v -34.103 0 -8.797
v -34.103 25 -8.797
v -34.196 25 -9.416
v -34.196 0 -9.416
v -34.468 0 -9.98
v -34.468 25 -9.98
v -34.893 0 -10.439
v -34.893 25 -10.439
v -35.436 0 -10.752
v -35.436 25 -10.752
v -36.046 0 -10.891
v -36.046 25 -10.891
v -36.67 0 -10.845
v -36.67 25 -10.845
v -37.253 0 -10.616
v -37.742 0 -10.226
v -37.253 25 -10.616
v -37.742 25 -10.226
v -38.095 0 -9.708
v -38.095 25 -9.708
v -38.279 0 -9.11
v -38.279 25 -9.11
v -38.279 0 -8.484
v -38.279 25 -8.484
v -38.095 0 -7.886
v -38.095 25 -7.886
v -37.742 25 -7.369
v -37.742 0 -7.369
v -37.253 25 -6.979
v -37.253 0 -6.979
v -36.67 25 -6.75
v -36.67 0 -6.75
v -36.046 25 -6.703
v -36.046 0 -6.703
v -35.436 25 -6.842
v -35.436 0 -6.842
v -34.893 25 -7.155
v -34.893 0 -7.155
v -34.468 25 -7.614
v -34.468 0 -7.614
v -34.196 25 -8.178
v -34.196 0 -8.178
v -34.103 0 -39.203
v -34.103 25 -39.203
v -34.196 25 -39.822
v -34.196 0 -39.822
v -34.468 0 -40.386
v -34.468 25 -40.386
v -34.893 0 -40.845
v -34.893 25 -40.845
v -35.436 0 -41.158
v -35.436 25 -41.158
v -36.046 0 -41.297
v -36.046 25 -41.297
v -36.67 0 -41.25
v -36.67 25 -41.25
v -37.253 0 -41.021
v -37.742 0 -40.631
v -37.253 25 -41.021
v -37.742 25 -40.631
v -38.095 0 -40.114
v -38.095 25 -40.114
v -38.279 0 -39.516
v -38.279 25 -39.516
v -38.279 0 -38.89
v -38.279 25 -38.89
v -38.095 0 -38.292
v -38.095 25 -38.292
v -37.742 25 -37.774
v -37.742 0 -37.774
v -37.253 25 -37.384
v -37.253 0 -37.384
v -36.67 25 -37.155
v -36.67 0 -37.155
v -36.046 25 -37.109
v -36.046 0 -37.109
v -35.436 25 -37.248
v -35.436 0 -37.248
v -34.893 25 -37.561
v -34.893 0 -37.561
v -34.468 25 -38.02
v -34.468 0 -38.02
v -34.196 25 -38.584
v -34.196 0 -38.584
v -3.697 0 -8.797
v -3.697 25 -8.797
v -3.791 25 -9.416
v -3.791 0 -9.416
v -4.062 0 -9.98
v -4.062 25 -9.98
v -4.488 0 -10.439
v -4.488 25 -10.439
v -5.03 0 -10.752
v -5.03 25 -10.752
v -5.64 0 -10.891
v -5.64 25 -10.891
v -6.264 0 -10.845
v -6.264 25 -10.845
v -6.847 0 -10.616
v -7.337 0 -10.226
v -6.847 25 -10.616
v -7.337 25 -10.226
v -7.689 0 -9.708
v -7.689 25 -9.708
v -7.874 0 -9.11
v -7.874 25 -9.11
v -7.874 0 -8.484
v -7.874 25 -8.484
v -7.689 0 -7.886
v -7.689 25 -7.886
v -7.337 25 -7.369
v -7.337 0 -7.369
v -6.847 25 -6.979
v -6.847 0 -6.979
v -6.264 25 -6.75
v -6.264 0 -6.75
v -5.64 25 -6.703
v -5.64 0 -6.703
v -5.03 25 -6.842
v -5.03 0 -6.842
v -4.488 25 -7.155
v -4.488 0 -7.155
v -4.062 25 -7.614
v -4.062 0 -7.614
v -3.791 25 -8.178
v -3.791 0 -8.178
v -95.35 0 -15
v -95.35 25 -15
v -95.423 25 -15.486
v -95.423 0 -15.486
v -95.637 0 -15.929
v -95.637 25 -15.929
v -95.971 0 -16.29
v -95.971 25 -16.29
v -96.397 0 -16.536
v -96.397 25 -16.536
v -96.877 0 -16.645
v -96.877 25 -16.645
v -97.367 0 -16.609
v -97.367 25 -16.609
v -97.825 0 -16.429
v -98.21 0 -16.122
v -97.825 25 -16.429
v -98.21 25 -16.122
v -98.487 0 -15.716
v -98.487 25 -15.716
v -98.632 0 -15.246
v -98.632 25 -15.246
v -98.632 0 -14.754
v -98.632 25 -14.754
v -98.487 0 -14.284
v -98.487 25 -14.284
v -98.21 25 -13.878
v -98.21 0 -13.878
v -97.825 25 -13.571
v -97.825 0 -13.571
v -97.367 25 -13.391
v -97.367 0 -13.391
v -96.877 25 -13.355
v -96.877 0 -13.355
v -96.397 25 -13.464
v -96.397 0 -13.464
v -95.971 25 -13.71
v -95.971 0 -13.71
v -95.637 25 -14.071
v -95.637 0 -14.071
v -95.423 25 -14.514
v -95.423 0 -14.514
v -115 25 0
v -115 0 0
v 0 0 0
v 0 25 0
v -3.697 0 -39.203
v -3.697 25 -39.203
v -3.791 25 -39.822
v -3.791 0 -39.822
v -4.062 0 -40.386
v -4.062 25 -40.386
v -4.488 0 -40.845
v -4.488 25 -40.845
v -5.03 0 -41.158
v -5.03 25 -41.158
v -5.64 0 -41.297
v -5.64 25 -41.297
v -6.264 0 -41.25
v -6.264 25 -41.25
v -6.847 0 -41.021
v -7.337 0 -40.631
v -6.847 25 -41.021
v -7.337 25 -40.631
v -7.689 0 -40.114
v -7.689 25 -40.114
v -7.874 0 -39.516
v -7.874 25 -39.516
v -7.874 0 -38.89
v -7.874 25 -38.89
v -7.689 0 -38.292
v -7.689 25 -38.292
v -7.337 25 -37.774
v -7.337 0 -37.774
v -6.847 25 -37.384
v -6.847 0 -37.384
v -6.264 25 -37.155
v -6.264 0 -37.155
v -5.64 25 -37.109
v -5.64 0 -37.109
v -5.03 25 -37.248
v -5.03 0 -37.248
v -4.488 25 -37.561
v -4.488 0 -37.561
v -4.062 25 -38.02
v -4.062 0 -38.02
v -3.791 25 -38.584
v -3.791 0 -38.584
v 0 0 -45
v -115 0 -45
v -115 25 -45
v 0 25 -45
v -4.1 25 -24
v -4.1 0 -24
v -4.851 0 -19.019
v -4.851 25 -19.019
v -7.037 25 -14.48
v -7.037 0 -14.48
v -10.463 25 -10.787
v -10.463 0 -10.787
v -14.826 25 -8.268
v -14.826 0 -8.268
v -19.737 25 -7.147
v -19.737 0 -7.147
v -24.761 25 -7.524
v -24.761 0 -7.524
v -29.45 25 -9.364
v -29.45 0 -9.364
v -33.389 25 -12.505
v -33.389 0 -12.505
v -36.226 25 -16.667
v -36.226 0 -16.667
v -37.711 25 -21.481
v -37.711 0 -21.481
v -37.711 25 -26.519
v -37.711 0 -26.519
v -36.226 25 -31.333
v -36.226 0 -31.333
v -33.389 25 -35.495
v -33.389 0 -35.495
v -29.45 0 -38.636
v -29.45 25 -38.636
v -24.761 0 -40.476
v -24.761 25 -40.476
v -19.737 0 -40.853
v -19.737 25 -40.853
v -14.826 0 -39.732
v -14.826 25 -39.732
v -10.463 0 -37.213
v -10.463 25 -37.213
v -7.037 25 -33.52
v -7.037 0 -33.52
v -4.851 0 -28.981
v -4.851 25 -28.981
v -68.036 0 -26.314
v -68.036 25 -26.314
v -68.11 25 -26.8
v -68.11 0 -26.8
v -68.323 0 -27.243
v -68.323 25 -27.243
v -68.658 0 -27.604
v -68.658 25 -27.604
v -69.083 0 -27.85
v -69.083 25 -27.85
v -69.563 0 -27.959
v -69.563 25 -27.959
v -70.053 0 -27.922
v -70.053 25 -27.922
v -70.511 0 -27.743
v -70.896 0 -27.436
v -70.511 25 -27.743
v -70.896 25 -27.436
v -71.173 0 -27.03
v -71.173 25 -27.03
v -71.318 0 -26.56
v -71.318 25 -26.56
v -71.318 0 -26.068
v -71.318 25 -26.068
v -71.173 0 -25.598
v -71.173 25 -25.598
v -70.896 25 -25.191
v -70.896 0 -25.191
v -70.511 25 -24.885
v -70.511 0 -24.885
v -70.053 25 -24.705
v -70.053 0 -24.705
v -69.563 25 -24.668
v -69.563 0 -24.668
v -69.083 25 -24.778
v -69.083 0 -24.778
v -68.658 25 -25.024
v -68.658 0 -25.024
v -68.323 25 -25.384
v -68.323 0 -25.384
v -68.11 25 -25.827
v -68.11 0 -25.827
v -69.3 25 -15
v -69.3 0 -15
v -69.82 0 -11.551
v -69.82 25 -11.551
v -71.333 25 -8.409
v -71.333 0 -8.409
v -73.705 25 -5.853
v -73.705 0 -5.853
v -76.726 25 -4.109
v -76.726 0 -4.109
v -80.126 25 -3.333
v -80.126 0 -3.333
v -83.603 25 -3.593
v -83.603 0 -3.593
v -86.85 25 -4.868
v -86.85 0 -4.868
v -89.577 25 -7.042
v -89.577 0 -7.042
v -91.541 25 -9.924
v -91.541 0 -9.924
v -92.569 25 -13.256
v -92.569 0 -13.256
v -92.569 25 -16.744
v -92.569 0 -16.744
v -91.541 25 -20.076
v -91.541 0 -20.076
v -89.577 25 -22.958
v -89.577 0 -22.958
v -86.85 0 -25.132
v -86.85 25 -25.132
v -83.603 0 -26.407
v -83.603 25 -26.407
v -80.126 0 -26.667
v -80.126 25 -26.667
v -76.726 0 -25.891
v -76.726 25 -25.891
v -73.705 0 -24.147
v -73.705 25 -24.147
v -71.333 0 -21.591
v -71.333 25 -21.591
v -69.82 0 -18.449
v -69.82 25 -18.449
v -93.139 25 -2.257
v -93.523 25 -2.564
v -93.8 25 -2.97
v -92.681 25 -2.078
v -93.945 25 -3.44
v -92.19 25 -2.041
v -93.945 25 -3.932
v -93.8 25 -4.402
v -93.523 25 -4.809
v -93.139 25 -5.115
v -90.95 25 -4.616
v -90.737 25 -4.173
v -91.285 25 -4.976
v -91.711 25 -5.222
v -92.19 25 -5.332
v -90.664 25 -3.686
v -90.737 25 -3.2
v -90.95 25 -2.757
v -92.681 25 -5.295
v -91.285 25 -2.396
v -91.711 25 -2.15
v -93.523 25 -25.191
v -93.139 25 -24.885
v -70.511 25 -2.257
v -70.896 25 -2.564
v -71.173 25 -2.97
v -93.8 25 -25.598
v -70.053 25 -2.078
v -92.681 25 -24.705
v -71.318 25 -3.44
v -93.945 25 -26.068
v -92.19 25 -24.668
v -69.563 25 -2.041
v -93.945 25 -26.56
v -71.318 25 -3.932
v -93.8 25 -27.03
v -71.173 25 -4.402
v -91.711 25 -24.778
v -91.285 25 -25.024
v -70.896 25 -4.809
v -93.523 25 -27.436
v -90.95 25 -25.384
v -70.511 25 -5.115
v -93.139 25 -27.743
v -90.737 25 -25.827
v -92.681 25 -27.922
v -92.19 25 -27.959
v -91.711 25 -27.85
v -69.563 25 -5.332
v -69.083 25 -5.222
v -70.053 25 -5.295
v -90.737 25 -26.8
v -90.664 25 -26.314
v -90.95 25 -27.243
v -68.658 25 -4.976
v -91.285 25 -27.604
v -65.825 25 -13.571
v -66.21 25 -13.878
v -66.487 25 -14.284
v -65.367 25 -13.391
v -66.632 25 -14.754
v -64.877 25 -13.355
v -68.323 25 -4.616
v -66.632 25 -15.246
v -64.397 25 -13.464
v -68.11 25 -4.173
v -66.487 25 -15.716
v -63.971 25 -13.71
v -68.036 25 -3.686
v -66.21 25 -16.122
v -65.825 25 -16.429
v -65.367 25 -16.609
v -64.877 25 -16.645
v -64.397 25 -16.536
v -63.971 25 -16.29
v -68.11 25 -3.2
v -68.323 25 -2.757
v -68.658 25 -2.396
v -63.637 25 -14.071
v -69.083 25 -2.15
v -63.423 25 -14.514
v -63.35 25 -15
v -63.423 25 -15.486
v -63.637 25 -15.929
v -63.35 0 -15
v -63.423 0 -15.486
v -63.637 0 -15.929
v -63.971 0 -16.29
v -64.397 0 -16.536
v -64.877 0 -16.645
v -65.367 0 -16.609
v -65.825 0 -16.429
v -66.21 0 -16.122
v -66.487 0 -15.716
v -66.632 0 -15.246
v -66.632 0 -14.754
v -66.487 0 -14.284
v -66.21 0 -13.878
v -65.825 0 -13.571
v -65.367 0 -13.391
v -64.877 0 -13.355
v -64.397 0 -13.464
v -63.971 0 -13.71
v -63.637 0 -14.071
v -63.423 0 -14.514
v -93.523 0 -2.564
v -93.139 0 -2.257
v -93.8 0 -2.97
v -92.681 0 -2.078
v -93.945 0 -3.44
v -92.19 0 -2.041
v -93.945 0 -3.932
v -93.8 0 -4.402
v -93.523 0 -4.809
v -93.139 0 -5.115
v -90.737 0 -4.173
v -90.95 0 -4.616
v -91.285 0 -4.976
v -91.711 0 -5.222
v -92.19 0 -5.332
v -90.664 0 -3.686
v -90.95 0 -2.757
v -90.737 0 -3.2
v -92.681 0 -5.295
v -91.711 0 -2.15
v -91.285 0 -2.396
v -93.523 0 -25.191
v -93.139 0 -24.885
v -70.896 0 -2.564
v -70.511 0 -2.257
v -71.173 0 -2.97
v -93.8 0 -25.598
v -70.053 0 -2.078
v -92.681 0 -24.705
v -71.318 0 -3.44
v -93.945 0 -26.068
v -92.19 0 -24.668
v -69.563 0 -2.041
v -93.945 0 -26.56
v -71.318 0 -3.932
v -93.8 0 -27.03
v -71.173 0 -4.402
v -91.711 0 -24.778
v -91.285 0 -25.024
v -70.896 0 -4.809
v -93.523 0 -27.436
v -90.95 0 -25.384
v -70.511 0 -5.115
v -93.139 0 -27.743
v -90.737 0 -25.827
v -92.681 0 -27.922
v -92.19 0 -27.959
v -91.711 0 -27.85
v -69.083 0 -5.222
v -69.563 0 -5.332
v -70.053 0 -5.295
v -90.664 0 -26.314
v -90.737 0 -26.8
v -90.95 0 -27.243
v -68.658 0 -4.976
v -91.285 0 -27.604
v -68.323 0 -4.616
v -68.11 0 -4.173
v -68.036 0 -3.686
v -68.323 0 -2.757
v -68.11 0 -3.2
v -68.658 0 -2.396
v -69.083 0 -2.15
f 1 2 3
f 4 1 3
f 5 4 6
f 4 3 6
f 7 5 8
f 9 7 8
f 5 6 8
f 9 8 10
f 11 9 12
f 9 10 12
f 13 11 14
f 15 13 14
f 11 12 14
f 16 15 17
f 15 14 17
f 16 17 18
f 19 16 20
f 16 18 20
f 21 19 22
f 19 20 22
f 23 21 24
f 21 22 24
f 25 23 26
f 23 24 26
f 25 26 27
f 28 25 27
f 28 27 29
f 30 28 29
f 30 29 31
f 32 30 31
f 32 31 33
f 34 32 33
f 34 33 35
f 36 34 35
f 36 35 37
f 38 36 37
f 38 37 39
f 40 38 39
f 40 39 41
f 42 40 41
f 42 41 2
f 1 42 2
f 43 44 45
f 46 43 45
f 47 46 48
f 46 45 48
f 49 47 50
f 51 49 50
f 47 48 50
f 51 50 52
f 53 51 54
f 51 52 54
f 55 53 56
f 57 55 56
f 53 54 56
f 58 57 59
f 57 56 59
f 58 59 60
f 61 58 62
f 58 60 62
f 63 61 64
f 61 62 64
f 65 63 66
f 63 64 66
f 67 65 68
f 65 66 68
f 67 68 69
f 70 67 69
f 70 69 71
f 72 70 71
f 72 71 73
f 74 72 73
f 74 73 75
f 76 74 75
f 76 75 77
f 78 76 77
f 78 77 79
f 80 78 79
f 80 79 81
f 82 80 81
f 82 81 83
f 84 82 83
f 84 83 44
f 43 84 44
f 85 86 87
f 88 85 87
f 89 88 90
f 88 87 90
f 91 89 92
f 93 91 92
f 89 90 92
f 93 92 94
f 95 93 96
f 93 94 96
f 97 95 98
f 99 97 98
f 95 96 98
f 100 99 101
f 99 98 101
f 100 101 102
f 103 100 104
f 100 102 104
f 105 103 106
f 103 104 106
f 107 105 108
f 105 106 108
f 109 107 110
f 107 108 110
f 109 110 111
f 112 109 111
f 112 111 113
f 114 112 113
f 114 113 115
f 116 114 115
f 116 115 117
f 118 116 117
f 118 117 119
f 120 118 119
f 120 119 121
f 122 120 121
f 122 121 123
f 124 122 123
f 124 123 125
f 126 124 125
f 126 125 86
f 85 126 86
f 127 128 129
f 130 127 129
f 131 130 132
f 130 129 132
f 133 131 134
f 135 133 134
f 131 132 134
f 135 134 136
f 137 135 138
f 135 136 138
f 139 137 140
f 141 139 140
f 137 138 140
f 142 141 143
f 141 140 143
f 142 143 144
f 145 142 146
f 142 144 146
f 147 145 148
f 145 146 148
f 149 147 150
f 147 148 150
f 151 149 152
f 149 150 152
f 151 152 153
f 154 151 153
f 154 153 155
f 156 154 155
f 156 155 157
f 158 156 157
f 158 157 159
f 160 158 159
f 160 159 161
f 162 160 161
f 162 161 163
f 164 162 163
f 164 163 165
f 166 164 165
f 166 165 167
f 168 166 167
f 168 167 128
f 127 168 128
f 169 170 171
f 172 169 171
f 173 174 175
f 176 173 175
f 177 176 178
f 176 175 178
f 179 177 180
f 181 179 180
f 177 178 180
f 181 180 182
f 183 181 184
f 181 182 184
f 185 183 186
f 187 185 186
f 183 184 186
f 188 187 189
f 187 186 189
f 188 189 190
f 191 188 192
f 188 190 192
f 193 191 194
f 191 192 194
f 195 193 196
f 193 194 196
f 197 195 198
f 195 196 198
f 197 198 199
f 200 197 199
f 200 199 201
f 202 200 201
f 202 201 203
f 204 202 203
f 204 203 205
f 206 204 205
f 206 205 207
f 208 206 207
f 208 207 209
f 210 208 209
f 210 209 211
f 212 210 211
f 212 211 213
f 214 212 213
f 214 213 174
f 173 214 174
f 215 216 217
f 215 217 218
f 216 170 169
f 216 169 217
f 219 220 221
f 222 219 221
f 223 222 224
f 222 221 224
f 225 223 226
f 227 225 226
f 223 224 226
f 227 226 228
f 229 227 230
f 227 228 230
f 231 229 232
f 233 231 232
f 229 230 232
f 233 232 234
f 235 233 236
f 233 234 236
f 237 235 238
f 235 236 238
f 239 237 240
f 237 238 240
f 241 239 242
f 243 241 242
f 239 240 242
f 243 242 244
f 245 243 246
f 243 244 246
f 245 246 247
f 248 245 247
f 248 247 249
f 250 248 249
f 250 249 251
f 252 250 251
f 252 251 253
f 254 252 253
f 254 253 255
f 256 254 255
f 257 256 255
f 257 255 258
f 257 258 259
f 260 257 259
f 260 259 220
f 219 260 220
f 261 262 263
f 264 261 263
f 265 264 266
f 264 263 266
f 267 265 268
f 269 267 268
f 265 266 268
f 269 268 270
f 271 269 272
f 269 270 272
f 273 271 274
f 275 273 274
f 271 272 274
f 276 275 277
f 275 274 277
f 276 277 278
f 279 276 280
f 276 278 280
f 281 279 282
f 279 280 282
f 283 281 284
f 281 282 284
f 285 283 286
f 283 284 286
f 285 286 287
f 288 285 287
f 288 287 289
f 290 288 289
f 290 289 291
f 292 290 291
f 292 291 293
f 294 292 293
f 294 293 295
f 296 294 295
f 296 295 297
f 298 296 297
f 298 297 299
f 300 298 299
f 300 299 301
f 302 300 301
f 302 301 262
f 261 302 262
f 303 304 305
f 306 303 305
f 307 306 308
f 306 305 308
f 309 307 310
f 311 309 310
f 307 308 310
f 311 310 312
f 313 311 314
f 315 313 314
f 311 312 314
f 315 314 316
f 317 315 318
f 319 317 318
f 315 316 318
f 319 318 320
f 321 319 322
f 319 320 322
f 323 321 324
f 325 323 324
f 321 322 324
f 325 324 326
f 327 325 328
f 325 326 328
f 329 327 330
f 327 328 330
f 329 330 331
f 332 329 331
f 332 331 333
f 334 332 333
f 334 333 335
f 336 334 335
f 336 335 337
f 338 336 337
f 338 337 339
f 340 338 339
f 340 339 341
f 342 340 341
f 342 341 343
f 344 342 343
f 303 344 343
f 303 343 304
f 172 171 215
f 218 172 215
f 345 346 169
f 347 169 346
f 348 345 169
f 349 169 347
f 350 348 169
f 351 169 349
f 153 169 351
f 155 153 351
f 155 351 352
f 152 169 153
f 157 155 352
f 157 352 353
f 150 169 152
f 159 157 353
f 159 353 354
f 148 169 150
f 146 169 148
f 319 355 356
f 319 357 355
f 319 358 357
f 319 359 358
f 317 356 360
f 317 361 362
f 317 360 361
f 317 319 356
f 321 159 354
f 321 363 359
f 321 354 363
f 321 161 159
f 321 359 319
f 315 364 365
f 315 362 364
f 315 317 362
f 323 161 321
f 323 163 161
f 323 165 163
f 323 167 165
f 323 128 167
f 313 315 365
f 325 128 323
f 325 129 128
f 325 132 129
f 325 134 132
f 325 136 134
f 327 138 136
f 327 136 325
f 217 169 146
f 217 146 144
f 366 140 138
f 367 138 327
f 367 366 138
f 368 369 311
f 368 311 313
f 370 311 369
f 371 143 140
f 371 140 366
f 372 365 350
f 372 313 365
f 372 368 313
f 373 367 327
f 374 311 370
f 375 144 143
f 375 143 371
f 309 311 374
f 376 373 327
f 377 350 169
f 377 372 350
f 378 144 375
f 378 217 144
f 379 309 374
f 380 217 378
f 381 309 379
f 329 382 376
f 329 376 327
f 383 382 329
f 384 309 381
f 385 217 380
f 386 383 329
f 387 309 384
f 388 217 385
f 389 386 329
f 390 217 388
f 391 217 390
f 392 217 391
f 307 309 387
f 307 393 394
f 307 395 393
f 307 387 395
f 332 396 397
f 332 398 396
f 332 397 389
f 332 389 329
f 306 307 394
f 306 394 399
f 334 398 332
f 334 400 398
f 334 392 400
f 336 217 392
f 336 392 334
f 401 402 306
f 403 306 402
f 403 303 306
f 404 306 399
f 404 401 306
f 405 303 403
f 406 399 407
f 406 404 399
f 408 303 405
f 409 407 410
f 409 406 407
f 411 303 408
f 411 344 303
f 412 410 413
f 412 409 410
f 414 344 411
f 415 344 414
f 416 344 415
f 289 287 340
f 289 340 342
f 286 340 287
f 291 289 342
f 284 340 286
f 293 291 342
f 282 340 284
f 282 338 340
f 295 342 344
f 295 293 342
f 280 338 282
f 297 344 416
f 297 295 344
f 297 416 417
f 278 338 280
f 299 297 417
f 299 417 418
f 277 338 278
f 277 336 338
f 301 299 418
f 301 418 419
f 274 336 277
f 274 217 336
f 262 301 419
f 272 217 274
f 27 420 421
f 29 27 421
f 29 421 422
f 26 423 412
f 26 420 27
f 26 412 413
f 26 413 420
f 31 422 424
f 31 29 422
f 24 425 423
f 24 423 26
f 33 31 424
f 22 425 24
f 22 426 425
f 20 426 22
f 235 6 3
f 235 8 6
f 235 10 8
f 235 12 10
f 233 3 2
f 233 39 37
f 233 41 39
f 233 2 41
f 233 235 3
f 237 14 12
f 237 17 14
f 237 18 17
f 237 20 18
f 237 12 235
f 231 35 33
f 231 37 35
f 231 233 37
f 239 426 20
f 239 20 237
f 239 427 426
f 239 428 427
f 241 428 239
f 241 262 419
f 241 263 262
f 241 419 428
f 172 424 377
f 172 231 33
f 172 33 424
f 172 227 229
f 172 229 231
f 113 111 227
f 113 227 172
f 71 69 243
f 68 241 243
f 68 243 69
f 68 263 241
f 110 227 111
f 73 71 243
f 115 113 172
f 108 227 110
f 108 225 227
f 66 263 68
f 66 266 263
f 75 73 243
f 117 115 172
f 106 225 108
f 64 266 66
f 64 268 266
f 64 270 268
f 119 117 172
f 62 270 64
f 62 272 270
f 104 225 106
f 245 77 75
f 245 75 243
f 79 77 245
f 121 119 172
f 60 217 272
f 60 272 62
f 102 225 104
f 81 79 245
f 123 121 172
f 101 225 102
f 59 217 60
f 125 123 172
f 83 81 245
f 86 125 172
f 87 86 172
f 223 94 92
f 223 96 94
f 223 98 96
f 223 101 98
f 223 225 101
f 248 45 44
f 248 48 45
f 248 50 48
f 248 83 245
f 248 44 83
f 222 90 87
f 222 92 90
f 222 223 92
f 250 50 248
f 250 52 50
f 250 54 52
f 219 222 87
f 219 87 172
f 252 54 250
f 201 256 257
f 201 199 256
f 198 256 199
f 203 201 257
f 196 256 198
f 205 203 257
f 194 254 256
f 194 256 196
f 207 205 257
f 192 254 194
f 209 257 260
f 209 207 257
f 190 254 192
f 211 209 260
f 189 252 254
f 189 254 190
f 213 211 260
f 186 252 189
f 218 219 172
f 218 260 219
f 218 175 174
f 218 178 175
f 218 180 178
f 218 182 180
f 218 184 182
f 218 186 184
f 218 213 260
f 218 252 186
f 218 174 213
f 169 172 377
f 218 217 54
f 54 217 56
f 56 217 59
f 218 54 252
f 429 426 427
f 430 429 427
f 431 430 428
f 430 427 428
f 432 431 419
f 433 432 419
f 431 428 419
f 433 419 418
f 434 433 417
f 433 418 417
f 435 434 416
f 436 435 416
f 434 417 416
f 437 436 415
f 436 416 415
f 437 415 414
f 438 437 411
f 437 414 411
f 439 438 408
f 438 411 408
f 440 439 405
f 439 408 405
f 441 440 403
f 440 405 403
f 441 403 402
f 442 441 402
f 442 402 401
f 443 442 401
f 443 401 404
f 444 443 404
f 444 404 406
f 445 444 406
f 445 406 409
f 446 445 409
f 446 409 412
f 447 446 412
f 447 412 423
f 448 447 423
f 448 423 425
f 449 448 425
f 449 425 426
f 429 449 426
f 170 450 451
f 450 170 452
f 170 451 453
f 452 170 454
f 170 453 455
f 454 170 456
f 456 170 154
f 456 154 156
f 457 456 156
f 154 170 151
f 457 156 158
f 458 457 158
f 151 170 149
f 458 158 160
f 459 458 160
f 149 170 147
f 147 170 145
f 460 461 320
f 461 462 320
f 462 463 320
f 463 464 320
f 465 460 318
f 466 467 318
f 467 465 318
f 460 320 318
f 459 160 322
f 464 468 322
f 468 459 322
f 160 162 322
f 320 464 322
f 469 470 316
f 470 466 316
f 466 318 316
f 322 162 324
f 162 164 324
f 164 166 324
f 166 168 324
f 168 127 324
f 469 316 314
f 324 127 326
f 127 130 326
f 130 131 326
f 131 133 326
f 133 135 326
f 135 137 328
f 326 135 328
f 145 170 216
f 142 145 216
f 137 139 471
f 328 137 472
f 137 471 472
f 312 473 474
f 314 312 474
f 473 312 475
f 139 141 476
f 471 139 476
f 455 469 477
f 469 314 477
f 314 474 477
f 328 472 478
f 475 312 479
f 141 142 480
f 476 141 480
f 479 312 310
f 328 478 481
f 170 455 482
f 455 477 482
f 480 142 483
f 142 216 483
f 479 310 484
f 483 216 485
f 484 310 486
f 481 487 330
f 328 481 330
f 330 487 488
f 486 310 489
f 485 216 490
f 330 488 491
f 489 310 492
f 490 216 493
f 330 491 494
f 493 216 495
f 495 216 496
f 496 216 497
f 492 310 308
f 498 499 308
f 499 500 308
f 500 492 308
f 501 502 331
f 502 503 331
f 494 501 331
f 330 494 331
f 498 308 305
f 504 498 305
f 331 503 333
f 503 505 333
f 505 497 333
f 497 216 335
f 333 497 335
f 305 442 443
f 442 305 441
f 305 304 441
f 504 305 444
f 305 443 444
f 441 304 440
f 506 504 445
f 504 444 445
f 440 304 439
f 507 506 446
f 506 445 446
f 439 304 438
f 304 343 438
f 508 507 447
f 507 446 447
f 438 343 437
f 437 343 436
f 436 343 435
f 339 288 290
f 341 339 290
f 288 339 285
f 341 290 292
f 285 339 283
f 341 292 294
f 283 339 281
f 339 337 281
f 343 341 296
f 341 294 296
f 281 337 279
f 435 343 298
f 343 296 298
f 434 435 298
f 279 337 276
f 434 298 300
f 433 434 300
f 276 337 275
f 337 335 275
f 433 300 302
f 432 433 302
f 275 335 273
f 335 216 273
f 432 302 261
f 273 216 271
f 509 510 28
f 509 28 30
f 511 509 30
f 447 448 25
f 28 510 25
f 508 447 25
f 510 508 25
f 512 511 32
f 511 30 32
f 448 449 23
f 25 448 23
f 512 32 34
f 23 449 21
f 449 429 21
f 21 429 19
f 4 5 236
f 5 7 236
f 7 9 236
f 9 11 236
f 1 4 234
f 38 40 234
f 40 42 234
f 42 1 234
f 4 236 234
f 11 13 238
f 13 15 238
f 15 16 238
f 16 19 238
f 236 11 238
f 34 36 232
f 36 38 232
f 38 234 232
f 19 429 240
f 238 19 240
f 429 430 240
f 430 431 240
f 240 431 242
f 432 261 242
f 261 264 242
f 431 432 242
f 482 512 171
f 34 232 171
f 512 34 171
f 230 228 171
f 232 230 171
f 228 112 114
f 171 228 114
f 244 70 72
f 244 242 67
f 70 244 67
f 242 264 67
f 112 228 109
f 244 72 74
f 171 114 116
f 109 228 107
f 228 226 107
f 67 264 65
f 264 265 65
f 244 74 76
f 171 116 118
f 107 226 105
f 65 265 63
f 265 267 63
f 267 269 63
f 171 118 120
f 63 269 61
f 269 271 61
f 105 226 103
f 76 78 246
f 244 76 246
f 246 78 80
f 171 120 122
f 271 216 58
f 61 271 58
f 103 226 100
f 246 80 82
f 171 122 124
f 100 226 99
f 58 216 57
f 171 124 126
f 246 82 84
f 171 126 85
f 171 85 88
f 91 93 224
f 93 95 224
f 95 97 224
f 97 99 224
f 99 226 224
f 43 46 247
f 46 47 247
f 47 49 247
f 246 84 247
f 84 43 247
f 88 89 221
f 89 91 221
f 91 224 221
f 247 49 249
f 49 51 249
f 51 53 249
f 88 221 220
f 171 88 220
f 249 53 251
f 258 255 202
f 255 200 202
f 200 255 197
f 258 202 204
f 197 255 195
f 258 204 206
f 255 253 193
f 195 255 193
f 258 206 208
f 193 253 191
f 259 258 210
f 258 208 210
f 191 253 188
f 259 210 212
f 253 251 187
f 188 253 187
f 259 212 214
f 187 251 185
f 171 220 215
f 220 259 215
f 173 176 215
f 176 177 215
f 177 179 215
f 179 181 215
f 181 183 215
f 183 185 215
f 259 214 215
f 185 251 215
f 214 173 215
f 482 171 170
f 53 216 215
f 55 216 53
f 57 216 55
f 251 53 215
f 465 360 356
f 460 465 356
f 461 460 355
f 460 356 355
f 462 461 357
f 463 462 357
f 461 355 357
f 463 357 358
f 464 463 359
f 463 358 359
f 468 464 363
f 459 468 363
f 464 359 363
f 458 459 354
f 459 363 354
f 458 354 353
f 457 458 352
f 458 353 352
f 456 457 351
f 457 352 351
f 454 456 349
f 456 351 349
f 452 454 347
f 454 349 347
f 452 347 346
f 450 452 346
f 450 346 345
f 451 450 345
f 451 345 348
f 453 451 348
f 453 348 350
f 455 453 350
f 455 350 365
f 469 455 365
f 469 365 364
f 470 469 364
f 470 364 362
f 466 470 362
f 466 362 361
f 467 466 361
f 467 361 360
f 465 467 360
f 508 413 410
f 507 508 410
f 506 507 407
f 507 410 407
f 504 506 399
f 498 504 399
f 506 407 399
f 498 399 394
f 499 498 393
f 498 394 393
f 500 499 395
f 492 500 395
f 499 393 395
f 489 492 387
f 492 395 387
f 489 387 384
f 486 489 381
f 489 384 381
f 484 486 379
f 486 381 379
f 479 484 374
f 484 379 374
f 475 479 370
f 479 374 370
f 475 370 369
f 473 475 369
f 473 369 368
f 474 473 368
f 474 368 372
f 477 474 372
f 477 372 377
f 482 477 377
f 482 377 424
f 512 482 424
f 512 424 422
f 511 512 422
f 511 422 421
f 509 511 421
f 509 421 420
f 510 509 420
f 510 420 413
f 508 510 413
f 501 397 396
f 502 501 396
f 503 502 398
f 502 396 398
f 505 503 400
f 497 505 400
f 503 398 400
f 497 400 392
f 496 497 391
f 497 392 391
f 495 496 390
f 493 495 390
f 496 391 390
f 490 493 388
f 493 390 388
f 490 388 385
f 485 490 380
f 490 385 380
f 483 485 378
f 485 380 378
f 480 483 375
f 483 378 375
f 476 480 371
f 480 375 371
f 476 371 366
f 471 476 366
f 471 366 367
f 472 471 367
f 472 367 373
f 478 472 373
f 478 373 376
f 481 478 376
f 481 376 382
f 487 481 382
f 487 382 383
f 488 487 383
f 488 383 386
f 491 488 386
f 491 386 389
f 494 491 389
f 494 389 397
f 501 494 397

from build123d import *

# Parameters (mm, degrees)
SKETCH1_W             = 115
SKETCH1_H             = 45
BOSS_EXTRUDE1_DEPTH   = 25
SKETCH2_R             = 11.7
SKETCH2_R_2           = 16.9
CUT_EXTRUDE1_DEPTH    = 26
M5X0_8_TAPPED_HOLE1_D = 4.2
M4X0_7_TAPPED_HOLE1_D = 3.3


with BuildPart() as part:
    # Sketch1 → Boss-Extrude1 (new body)
    with BuildSketch(Plane(origin=(0, 0, 0), x_dir=(1, 0, 0), z_dir=(0, 1, 0))):
        with Locations((-57.5, 22.5)):
            Rectangle(SKETCH1_W, SKETCH1_H)
    extrude(amount=BOSS_EXTRUDE1_DEPTH)

    # Sketch2 → Cut-Extrude1 (cut, through all)
    with BuildSketch(Plane.XZ):
        with Locations((-81, -15)):
            Circle(SKETCH2_R)
        with Locations((-21, -24)):
            Circle(SKETCH2_R_2)
    extrude(amount=-CUT_EXTRUDE1_DEPTH, mode=Mode.SUBTRACT)

    # M5x0.8 Tapped Hole1 (through all)
    with Locations(Plane(origin=(0, 0, 0), x_dir=(-1, 0, 0), z_dir=(0, -1, 0))):
        with Locations((36.202795796, 39.202795796), (5.797204204, 39.202795796), (5.797204204, 8.797204204), (36.202795796, 8.797204204)):
            Hole(M5X0_8_TAPPED_HOLE1_D / 2)

    # M4x0.7 Tapped Hole1 (through all)
    with Locations(Plane(origin=(0, 0, 0), x_dir=(-1, 0, 0), z_dir=(0, -1, 0))):
        with Locations((92.313708499, 3.686291501), (97, 15), (92.313708499, 26.313708499), (69.686291501, 26.313708499), (65, 15), (69.686291501, 3.686291501)):
            Hole(M4X0_7_TAPPED_HOLE1_D / 2)


solid = part.part
